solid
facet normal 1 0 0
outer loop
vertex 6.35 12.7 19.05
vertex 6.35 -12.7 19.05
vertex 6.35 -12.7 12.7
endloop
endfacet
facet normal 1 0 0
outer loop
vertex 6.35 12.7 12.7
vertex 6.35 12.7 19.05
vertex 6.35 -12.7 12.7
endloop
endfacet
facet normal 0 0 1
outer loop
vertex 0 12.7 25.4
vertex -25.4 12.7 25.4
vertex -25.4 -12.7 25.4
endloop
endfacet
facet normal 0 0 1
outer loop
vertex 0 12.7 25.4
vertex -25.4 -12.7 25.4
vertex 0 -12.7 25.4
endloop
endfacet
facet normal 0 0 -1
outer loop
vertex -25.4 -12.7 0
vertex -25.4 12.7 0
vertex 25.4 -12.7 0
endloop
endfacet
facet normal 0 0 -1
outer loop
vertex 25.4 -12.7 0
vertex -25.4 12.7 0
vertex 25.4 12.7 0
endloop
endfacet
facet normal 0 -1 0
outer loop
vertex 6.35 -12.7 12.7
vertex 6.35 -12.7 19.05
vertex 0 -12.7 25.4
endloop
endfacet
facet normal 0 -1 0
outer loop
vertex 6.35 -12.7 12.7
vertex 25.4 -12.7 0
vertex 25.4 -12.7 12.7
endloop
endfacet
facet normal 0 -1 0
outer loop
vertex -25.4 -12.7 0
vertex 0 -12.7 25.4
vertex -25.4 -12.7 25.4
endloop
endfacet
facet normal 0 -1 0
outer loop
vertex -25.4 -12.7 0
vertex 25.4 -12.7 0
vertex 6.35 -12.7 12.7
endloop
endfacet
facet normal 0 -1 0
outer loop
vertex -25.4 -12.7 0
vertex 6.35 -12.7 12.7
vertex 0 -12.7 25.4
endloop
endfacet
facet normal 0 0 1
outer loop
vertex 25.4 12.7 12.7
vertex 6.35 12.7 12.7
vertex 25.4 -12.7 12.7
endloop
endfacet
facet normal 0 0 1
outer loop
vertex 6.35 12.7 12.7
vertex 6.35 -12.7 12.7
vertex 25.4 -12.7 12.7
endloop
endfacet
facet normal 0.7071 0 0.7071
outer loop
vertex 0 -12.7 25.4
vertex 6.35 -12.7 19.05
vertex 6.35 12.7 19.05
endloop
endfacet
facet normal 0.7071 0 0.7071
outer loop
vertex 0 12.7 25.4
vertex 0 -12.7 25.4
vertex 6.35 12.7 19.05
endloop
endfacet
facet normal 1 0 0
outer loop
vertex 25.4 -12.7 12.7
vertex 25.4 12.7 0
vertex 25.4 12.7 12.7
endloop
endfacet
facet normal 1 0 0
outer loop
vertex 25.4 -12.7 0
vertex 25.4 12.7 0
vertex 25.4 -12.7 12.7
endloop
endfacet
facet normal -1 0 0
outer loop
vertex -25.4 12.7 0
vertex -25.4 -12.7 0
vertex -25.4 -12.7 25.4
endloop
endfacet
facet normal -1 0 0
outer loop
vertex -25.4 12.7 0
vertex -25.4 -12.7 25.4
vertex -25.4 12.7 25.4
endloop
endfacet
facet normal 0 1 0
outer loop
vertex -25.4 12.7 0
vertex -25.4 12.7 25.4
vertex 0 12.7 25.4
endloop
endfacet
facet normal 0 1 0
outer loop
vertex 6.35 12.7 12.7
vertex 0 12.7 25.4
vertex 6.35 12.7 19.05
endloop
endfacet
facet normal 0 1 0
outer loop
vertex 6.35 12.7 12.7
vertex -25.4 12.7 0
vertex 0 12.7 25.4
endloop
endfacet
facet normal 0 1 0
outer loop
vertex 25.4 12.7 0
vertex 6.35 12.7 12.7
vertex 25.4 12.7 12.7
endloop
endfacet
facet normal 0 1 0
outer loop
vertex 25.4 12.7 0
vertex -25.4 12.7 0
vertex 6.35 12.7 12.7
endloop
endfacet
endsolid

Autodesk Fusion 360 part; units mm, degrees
sketch "Sketch1" plane through (0, 0, 0) normal (0, 0, 1) x (1, 0, 0)
  line L0 (25.4, -12.7) -> (-25.4, -12.7)
  line L1 (-25.4, -12.7) -> (-25.4, 12.7)
  line L2 (-25.4, 12.7) -> (25.4, 12.7)
  line L3 (25.4, 12.7) -> (25.4, -12.7)
  line L4 (25.4, -12.7) -> (-25.4, 12.7) construction
  line L5 (-25.4, -12.7) -> (25.4, 12.7) construction
  dimension "d1" = 50.8
  dimension "d2" = 25.4
extrude "Extrude1" add sketch "Sketch1" along normal blind 25.4
sketch "Sketch2" plane through (0, -12.7, 0) normal (0, -1, 0) x (1, 0, 0)
  line L0 (-25.4, 0) -> (25.4, 0)
  line L1 (25.4, 0) -> (25.4, 25.4)
  line L2 (25.4, 25.4) -> (-25.4, 25.4)
  line L3 (-25.4, 25.4) -> (-25.4, 0)
  line L4 (25.4, 25.4) -> (6.35, 25.4)
  line L5 (6.35, 25.4) -> (6.35, 12.7)
  line L6 (6.35, 12.7) -> (25.4, 12.7)
  line L7 (25.4, 12.7) -> (25.4, 25.4)
  dimension "d5" = 19.05
  dimension "d6" = 12.7
extrude "Extrude2" cut sketch "Sketch2" against normal through all contours L1 L2 L4 L5 L6 L7
chamfer "Chamfer1" distance 6.35 angle 45 1 edges at (6.35, 0, 25.4)
